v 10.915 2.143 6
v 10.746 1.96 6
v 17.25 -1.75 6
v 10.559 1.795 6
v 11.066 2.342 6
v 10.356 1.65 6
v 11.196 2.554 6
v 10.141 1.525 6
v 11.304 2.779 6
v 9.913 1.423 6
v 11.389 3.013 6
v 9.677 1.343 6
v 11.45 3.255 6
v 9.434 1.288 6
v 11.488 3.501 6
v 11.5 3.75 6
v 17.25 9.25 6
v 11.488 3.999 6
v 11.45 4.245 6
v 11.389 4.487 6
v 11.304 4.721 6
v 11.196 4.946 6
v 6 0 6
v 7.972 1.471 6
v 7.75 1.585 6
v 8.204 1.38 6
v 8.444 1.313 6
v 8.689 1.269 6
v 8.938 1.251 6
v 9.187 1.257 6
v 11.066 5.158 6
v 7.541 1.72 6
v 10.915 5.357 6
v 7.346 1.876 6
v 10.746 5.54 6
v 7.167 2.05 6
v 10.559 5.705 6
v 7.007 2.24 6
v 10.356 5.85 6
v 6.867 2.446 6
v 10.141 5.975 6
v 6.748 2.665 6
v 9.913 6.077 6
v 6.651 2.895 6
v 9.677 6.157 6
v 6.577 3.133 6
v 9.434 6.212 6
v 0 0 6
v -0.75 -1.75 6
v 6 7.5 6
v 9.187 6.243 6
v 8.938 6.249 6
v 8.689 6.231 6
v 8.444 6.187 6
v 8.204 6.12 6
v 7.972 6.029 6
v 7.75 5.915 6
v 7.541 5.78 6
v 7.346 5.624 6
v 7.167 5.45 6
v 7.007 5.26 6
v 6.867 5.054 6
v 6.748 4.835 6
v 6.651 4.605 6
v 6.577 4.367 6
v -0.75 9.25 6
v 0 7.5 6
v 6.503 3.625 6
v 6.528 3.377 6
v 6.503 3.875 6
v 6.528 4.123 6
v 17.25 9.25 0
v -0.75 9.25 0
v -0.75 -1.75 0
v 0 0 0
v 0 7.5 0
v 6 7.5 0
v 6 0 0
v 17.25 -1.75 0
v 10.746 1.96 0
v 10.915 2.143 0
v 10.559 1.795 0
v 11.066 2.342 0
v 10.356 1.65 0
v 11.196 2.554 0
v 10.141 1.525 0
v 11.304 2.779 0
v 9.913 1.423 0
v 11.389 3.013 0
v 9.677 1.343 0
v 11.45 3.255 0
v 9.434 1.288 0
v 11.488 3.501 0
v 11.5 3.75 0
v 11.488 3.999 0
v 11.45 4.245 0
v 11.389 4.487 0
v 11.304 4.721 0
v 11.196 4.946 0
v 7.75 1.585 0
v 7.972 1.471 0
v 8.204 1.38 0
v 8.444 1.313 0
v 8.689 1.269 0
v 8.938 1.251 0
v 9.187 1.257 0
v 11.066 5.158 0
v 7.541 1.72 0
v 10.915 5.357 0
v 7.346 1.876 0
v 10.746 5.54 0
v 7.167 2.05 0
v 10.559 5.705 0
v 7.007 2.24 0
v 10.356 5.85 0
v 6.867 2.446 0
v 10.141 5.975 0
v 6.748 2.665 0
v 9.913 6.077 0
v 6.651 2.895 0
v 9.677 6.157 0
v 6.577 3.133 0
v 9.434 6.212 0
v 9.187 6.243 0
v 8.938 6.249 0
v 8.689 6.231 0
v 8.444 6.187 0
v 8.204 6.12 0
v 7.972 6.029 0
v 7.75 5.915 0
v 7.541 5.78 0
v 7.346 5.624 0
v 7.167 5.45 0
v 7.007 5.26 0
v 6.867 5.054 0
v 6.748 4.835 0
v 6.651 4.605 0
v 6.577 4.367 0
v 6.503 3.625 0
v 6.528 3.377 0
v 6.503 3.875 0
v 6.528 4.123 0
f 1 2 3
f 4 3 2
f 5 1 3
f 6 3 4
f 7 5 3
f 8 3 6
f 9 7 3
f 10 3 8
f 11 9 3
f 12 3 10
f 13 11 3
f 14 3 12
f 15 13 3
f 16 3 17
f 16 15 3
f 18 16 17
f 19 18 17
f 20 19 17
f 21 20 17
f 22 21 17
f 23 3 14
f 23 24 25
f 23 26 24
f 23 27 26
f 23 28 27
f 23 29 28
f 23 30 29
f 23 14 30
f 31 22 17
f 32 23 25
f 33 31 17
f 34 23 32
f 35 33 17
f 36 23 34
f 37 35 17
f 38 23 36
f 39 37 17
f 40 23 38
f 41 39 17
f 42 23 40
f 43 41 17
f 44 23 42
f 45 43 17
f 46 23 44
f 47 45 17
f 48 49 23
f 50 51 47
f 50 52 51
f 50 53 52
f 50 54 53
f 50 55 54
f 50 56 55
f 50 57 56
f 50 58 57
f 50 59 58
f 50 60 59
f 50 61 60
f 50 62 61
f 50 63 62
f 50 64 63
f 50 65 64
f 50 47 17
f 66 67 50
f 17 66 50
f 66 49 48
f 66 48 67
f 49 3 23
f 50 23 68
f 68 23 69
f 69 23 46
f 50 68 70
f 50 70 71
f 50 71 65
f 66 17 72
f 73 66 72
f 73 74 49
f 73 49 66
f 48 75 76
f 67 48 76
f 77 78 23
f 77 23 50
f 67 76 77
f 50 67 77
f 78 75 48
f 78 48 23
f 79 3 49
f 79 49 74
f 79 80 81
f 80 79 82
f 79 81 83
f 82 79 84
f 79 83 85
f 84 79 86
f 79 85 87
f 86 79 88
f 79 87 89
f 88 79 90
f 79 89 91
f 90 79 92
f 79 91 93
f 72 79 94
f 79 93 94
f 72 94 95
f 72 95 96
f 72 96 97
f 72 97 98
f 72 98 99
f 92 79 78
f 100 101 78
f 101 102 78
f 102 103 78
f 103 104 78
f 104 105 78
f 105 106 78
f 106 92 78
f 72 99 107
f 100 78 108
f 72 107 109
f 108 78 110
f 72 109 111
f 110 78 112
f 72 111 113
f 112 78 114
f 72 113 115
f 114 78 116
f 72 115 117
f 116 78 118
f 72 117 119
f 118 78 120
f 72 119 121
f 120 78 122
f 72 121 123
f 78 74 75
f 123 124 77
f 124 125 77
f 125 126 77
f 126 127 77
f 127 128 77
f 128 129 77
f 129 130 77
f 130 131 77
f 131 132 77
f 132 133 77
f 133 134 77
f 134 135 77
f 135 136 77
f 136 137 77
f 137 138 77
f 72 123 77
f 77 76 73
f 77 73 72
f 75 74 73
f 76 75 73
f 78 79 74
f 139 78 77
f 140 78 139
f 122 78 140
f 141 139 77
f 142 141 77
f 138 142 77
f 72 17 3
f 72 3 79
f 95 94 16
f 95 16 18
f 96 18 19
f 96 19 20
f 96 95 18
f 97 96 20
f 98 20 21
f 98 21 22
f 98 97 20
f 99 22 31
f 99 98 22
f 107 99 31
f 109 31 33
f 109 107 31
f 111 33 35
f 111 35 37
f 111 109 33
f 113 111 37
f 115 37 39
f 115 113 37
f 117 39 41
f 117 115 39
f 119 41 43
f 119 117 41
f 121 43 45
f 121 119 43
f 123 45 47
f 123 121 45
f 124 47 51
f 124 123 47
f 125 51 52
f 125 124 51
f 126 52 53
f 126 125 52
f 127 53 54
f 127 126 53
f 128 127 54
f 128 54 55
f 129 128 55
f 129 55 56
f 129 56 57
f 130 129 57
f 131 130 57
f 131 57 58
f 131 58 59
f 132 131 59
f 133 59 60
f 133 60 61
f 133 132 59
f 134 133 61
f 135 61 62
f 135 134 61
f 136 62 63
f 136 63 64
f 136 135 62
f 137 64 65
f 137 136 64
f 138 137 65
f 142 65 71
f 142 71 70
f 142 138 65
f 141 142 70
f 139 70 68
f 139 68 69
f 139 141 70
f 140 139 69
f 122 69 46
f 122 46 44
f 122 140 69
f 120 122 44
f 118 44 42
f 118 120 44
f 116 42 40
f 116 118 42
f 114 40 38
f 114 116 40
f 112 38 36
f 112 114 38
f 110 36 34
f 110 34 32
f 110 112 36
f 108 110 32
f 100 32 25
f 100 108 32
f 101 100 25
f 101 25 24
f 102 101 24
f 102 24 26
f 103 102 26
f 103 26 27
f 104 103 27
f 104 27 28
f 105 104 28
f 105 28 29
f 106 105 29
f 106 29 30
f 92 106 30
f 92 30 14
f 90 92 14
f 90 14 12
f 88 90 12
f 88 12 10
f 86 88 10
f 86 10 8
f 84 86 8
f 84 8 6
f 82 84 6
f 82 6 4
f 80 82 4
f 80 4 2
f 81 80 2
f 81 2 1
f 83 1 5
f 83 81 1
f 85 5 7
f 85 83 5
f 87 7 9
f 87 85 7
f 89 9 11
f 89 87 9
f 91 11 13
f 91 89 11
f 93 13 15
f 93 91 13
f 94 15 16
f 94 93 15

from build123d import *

# Parameters (mm, degrees)
SKETCH_1_W      = 13
SKETCH_1_H      = 11
SKETCH_1_R      = 2.5
SKETCH_1_W_2    = 6
SKETCH_1_H_2    = 7.5
EXTRUDE_1_DEPTH = 6
SKETCH_2_W      = 6
SKETCH_2_H      = 11
EXTRUDE_2_DEPTH = 5


with BuildPart() as part:
    # 草图1 → 凸台-拉伸1 (new body)
    with BuildSketch(Plane.XY):
        with Locations((5.75, 3.75)):
            Rectangle(SKETCH_1_W, SKETCH_1_H)
        with Locations((9, 3.75)):
            Circle(SKETCH_1_R, mode=Mode.SUBTRACT)
        with Locations((3, 3.75)):
            Rectangle(SKETCH_1_W_2, SKETCH_1_H_2, mode=Mode.SUBTRACT)
    extrude(amount=EXTRUDE_1_DEPTH)

    # 草图2 → 凸台-拉伸2 (add)
    with BuildSketch(Plane(origin=(12.25, 0, 0), x_dir=(0, 0, -1), z_dir=(1, 0, 0))):
        with Locations((-3, 3.75)):
            Rectangle(SKETCH_2_W, SKETCH_2_H)
    extrude(amount=EXTRUDE_2_DEPTH)


solid = part.part
